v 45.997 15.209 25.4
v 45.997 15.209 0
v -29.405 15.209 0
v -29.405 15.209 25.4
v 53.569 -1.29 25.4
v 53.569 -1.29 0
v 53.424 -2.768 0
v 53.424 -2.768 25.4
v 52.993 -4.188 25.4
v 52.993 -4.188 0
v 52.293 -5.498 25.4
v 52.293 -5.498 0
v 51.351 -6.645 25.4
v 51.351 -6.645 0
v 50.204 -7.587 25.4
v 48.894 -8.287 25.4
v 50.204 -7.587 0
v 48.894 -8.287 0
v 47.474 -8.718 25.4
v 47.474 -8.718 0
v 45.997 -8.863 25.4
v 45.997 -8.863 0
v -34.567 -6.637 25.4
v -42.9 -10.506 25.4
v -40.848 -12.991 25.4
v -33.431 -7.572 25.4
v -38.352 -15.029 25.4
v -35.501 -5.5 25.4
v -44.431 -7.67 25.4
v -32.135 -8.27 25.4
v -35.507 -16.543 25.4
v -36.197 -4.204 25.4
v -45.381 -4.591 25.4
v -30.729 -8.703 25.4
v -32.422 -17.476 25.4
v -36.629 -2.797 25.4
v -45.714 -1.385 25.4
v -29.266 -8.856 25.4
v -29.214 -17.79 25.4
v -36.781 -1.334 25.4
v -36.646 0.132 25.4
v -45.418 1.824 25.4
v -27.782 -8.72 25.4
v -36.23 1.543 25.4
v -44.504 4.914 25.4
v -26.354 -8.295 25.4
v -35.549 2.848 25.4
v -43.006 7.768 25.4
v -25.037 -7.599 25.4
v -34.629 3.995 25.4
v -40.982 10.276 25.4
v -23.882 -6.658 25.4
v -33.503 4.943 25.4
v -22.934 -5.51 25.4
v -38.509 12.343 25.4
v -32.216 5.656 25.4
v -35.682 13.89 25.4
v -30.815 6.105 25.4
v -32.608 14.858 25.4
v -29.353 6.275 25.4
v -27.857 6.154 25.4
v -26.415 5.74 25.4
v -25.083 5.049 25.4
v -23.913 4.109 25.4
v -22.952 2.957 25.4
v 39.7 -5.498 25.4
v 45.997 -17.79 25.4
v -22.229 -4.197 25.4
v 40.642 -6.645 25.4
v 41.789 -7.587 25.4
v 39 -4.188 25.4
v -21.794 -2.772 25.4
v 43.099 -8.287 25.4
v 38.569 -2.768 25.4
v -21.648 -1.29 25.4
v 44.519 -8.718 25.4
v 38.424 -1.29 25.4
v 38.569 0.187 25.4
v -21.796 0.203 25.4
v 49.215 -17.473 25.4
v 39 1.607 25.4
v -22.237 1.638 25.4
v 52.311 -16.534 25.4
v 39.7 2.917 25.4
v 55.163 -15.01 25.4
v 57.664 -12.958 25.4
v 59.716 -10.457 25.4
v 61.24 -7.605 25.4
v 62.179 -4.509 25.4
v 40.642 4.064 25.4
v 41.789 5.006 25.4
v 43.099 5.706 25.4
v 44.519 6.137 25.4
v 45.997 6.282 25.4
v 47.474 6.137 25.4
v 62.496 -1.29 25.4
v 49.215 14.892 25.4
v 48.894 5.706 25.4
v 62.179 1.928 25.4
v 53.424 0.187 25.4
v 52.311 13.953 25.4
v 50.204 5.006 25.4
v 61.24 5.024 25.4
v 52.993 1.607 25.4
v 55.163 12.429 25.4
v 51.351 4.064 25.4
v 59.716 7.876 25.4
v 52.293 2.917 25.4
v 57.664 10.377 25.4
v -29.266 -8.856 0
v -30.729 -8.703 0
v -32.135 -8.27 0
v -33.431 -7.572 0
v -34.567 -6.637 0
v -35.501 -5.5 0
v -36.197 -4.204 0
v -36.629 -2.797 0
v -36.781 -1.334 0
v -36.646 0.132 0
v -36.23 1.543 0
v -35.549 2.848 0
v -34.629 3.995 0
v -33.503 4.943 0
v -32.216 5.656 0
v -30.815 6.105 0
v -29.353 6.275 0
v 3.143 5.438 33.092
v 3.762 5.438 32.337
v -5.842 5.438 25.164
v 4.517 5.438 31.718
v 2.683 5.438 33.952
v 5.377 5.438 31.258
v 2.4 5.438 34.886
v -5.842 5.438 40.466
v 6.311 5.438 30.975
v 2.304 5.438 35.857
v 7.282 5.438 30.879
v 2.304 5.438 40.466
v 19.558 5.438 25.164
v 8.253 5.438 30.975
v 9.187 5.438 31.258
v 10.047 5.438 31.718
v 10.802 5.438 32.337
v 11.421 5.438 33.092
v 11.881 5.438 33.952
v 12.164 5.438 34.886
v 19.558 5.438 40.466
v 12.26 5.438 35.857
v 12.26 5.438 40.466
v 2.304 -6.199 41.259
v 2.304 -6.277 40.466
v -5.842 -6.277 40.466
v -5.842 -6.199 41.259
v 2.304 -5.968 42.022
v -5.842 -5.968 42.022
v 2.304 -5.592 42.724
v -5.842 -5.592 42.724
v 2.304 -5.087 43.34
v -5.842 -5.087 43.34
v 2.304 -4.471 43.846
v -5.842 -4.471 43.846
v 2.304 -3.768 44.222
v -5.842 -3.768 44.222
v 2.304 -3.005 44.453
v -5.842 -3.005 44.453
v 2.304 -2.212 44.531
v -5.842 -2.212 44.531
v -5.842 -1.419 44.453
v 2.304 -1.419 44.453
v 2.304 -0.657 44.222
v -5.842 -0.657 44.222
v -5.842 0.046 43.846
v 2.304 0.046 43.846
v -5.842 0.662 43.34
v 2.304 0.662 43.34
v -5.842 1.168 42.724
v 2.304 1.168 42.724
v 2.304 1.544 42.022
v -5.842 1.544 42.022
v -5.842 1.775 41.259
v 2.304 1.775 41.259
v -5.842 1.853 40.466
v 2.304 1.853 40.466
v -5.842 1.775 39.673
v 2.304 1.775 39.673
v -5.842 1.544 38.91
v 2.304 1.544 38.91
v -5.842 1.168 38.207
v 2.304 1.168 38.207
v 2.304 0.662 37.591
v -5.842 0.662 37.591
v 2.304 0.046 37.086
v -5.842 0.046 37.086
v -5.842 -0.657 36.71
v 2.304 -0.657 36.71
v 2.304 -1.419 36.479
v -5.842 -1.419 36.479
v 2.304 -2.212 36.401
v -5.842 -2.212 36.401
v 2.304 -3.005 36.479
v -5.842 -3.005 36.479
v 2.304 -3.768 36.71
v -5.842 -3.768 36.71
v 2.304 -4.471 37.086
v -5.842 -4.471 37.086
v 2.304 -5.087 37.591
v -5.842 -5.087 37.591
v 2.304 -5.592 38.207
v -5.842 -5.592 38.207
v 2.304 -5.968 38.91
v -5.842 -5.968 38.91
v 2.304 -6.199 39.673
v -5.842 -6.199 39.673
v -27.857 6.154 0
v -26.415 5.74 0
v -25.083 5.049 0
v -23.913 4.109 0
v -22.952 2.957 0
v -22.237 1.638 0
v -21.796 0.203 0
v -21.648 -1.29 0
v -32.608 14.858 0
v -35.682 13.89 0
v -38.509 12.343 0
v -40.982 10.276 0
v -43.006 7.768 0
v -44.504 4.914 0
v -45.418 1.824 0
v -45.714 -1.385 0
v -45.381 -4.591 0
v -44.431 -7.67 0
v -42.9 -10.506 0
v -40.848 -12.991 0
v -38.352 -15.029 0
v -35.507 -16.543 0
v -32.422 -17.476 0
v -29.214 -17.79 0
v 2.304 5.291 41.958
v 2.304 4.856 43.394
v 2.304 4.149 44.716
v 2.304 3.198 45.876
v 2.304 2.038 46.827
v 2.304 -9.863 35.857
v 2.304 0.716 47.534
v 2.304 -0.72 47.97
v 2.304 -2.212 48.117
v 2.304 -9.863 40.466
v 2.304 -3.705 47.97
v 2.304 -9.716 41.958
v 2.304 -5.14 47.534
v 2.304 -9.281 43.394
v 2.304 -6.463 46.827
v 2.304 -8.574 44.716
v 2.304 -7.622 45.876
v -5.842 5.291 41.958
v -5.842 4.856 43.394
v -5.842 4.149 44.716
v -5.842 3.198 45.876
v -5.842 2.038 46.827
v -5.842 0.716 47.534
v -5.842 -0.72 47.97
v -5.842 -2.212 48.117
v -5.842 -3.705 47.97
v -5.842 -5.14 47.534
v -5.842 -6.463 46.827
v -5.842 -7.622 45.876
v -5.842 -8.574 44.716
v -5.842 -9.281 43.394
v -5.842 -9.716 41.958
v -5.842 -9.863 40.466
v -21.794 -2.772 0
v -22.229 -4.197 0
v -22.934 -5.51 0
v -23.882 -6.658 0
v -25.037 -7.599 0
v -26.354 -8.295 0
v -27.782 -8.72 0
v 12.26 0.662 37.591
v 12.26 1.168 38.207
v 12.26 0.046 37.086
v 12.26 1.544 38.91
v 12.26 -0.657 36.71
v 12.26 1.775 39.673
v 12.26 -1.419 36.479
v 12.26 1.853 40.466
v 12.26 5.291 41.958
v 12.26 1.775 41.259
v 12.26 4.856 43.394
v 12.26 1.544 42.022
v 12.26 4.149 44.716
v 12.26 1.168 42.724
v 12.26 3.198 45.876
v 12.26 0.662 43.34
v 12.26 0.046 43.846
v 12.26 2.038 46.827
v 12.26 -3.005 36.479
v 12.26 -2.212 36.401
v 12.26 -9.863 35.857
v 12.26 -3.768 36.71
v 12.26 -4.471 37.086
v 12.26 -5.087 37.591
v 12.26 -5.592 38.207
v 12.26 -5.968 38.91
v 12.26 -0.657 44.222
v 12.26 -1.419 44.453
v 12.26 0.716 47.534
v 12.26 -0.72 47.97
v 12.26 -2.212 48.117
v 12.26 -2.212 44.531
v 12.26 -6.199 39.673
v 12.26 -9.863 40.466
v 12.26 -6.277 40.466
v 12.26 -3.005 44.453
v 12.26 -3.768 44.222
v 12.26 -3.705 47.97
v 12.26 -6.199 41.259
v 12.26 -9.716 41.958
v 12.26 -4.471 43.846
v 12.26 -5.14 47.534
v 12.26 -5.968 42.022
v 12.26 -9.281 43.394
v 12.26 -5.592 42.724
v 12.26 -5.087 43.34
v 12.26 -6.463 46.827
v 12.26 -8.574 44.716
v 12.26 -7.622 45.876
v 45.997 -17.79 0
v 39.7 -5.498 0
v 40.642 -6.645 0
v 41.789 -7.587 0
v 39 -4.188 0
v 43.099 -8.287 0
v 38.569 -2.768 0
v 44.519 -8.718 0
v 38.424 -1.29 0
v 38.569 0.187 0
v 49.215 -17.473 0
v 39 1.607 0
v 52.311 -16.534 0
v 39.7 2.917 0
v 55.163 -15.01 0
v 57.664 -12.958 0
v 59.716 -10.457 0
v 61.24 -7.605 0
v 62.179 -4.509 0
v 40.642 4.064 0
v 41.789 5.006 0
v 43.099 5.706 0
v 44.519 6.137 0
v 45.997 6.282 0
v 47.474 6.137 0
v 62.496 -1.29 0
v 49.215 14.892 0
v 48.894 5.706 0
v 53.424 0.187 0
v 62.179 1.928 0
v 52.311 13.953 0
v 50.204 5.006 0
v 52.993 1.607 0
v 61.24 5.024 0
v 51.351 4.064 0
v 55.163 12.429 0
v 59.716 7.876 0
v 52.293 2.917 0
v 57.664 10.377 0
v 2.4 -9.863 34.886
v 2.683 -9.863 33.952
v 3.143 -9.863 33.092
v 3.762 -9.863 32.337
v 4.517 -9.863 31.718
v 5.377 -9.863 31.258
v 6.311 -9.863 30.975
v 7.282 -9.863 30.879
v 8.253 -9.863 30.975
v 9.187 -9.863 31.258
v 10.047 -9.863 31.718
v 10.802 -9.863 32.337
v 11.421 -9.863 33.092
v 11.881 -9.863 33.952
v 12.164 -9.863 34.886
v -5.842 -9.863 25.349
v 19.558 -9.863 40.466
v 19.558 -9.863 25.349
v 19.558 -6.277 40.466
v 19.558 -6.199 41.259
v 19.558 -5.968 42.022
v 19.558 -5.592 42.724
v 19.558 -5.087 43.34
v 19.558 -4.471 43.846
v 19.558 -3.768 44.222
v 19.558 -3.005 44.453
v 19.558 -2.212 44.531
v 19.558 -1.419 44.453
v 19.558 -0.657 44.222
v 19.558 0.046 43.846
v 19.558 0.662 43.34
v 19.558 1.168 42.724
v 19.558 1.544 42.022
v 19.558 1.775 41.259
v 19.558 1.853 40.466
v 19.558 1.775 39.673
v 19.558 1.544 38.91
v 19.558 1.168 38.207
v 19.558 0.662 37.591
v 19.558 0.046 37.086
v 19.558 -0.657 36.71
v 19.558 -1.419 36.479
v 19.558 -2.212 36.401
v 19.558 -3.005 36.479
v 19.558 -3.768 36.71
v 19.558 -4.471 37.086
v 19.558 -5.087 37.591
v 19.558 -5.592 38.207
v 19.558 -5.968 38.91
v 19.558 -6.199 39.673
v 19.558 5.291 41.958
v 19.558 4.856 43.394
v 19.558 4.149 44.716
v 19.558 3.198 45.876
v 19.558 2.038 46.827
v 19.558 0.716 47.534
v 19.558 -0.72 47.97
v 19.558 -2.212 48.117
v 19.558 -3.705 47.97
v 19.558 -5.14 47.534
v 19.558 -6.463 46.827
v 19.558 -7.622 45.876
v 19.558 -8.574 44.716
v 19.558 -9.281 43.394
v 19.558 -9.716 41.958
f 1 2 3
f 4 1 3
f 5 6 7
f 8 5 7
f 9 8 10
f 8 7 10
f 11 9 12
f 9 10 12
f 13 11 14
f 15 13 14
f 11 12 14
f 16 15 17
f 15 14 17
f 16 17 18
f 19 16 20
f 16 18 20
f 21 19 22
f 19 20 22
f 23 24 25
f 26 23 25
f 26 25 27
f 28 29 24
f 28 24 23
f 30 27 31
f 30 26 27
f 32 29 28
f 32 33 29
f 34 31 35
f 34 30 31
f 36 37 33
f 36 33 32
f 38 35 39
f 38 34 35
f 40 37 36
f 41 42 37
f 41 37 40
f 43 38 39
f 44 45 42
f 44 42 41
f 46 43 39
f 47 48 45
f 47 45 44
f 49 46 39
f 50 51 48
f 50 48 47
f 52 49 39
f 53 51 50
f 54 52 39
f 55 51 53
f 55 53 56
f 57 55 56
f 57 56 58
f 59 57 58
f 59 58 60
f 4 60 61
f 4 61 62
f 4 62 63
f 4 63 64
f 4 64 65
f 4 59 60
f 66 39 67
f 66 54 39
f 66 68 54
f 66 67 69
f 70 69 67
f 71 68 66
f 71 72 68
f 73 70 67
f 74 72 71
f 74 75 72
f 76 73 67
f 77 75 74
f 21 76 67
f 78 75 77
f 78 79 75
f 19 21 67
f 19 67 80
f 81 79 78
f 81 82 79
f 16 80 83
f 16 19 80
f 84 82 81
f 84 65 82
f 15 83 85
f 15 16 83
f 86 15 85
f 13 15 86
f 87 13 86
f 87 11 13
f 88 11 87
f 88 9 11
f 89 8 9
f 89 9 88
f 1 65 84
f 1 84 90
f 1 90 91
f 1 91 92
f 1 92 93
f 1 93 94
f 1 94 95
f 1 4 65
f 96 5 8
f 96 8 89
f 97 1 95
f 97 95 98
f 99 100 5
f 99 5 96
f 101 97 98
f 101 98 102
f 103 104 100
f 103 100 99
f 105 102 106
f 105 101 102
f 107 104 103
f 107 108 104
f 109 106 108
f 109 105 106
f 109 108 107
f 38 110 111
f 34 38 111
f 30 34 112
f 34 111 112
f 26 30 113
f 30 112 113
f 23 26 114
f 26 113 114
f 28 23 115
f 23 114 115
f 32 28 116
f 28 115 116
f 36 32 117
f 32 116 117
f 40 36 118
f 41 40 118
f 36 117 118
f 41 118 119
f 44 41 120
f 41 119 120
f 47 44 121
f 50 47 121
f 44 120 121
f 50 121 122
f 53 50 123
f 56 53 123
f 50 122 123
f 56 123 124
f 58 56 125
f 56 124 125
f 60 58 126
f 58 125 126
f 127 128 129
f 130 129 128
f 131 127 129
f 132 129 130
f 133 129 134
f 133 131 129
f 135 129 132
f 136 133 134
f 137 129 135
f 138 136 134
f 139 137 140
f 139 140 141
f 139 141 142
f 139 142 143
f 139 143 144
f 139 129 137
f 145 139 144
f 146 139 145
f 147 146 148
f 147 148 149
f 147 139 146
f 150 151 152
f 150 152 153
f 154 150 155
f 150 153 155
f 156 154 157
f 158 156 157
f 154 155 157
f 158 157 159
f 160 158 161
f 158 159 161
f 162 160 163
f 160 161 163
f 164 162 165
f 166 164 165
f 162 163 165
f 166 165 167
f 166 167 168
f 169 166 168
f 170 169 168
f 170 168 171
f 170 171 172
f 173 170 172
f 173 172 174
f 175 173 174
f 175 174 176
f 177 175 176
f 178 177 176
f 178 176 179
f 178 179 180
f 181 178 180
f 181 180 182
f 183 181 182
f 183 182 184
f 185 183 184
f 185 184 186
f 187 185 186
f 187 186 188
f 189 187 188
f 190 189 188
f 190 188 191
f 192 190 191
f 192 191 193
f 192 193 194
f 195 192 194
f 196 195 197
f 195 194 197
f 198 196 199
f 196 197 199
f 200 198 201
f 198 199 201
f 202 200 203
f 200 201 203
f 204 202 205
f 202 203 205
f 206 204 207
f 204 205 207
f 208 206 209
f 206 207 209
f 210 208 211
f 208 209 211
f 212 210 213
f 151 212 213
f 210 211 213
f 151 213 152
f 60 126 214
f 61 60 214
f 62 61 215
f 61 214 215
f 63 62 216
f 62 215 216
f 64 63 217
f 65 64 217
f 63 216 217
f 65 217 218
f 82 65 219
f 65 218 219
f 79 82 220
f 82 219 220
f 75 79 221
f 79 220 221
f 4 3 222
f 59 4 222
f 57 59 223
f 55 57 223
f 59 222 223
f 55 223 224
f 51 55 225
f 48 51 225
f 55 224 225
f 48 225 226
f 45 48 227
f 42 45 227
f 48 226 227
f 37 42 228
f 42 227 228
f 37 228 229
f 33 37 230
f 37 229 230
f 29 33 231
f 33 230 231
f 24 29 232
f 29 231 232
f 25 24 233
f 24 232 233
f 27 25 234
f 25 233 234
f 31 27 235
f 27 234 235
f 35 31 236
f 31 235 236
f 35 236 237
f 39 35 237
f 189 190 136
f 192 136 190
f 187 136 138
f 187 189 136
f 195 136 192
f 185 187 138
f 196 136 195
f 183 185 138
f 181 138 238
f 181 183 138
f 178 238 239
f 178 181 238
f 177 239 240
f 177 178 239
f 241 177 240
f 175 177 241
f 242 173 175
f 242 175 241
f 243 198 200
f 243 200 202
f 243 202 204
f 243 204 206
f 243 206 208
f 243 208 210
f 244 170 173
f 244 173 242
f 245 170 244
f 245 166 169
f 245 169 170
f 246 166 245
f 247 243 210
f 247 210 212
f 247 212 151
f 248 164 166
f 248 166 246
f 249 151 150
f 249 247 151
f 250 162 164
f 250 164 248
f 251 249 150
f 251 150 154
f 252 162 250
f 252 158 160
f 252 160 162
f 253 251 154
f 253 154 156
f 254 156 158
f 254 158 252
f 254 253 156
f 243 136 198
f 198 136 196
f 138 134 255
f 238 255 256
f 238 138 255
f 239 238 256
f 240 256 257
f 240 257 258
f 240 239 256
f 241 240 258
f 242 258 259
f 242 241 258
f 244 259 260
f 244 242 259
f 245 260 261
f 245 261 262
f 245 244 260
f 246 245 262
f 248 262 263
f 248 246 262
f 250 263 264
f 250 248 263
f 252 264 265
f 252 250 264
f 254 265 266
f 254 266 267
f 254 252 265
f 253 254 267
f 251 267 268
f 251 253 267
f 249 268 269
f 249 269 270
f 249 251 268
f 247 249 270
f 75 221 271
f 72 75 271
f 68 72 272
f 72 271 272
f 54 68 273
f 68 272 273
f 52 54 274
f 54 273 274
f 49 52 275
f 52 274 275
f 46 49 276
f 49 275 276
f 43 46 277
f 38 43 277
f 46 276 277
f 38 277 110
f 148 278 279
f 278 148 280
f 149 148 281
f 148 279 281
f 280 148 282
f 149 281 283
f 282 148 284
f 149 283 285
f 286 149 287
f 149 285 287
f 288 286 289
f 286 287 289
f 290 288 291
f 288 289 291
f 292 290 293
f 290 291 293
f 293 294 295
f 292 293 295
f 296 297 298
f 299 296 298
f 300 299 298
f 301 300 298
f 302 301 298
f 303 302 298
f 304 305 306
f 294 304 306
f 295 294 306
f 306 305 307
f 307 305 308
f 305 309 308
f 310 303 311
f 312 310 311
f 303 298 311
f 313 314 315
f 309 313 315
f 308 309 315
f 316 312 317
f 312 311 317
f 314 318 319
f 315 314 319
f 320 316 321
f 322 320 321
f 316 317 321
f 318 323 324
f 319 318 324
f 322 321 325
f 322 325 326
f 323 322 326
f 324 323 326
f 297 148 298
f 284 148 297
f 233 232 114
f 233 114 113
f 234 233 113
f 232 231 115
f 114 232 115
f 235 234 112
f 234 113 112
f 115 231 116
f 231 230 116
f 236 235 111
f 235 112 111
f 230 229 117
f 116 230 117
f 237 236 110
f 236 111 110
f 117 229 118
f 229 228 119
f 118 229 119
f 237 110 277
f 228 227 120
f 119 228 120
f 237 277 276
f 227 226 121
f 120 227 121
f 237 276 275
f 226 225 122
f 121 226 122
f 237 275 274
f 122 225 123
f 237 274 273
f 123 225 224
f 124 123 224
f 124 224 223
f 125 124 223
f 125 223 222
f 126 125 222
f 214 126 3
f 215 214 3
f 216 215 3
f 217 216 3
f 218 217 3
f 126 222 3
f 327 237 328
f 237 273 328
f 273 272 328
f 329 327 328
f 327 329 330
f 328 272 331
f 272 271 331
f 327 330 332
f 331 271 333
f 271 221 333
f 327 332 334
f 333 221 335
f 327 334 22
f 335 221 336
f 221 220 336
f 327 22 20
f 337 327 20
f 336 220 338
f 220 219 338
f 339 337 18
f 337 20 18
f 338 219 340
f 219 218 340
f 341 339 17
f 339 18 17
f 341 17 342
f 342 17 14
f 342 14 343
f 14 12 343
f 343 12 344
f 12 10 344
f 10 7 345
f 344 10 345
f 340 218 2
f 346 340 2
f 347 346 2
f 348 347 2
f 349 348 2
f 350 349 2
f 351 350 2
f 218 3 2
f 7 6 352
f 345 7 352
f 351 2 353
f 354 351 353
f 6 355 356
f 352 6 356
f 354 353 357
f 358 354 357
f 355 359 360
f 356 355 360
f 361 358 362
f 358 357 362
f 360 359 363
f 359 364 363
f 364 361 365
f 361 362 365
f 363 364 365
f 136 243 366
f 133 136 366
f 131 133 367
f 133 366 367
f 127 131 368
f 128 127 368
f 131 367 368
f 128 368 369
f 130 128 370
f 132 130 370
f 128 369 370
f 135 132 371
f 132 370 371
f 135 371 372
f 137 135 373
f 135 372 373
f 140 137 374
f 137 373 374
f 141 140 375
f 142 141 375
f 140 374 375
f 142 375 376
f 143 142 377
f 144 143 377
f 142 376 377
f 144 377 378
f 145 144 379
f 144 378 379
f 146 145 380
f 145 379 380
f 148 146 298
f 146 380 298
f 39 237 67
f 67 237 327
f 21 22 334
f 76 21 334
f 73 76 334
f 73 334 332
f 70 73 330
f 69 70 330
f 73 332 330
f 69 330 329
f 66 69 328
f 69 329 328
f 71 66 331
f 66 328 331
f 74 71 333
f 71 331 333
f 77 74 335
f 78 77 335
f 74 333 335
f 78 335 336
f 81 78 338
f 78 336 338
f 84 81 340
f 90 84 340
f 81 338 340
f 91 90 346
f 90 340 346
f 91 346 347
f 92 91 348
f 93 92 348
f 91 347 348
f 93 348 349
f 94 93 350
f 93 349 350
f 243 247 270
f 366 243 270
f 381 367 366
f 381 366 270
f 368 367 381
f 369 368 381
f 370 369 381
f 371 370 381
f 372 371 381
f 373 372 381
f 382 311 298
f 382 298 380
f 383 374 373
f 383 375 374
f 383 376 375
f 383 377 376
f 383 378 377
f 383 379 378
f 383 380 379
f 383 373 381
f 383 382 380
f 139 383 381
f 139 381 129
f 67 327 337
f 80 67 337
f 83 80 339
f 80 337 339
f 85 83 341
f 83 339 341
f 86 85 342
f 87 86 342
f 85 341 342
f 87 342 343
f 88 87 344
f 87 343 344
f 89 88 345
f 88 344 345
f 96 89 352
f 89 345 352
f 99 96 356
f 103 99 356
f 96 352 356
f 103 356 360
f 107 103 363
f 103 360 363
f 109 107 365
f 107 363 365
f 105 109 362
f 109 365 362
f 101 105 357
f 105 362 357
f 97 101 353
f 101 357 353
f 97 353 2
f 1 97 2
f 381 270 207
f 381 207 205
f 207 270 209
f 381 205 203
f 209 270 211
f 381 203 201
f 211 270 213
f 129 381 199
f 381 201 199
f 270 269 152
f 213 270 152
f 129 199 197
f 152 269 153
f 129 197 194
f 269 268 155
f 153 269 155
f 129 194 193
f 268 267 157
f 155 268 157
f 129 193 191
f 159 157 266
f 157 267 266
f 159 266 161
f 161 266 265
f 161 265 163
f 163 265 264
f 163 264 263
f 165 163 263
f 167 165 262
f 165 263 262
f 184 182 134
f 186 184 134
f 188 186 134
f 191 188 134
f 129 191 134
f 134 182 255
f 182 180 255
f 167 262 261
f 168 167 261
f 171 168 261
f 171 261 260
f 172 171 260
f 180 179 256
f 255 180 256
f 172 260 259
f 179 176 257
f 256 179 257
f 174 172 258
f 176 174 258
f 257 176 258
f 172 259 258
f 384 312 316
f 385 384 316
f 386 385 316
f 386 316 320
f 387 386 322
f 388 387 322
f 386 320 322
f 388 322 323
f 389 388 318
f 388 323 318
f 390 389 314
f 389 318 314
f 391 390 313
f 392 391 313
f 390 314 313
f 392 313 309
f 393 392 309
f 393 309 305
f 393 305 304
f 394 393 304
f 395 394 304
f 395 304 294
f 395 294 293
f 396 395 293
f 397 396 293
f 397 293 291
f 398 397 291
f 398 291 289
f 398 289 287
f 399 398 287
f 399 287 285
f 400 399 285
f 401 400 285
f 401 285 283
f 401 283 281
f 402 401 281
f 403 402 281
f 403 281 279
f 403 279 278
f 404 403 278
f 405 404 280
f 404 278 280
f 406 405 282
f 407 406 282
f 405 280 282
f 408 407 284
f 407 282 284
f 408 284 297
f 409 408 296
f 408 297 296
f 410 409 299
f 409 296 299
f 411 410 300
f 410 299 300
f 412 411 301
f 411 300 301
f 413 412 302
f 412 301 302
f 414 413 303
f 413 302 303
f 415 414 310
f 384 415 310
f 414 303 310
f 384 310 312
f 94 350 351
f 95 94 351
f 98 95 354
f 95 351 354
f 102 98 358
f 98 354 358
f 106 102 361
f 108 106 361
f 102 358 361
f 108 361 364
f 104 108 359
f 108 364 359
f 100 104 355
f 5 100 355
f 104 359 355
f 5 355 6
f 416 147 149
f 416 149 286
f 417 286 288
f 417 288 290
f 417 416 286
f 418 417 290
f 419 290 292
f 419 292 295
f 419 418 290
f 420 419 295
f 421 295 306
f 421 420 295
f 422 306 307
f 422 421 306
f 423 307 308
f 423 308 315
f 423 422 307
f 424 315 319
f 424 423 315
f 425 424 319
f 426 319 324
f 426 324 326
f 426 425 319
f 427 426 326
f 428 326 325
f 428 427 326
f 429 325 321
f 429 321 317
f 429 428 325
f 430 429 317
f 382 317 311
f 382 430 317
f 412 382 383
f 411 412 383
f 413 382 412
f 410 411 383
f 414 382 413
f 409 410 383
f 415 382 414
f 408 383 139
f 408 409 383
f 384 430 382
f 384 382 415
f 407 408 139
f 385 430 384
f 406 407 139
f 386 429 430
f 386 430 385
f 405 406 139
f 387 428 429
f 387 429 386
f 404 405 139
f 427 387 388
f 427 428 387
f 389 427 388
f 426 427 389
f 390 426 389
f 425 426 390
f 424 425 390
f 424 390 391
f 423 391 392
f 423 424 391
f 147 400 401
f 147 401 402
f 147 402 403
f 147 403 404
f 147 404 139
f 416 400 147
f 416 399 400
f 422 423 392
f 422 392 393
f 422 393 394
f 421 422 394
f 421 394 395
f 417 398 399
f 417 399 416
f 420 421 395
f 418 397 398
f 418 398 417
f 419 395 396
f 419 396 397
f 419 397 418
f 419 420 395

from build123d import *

# Parameters (mm, degrees)
F1_DEPTH = 25.4
F3_DEPTH = 12.7
F6_W     = 9.955159
F6_H     = 15.854515
F7_DEPTH = 12.7
F8_R     = 4.065218
F9_DEPTH = 25.654


with BuildPart() as f1:
    # F0 (on Top) → F1 (new body)
    with BuildSketch(Plane.XY):
        with BuildLine():
            Line((45.996532, 15.209274), (-29.404597, 15.209274))
            Line((-29.404597, 15.209274), (-29.353035, 6.275321))
            ThreePointArc((-29.353035, 6.275321), (-23.913131, 4.109294), (-21.647612, -1.289934))
            ThreePointArc((-21.647612, -1.289934), (-23.882058, -6.658477), (-29.265704, -8.856288))
            Line((-29.265704, -8.856288), (-29.214142, -17.790241))
            Line((-29.214142, -17.790241), (45.996532, -17.790241))
            Line((45.996532, -17.790241), (45.996532, -8.863065))
            ThreePointArc((45.996532, -8.863065), (38.42395, -1.290483), (45.996532, 6.282098))
            Line((45.996532, 6.282098), (45.996532, 15.209274))
        make_face()
        with BuildLine():
            Line((-29.353035, 6.275321), (-29.404597, 15.209274))
            ThreePointArc((-29.404597, 15.209274), (-45.714174, -1.385163), (-29.214142, -17.790241))
            Line((-29.214142, -17.790241), (-29.265704, -8.856288))
            ThreePointArc((-29.265704, -8.856288), (-36.780546, -1.333603), (-29.353035, 6.275321))
        make_face()
        with BuildLine():
            ThreePointArc((45.996532, -17.790241), (62.49629, -1.290483), (45.996532, 15.209274))
            Line((45.996532, 15.209274), (45.996532, 6.282098))
            ThreePointArc((45.996532, 6.282098), (51.351156, 4.06414), (53.569113, -1.290483))
            ThreePointArc((53.569113, -1.290483), (51.351156, -6.645107), (45.996532, -8.863065))
            Line((45.996532, -8.863065), (45.996532, -17.790241))
        make_face()
    extrude(amount=F1_DEPTH)


with BuildPart() as f3:
    # F2 (on Right) → F3 (new body, symmetric)
    with BuildSketch(Plane.YZ):
        Polygon((-9.862985, 40.465884), (-9.862985, 25.348788), (5.438465, 25.164433), (5.438465, 40.465884), align=None)
        with BuildLine():
            ThreePointArc((5.438465, 40.465884), (-2.21226, 48.116609), (-9.862985, 40.465884))
            Line((-9.862985, 40.465884), (5.438465, 40.465884))
        make_face()
    extrude(amount=F3_DEPTH, both=True)


with BuildPart() as f1_1:
    # F4: moved
    add(f1.part)


with BuildPart() as f3_1:
    # F5: moved
    add(f3.part.moved(Location((6.858, 0, 0))))

    # F6 (on Front) → F7 (cut, symmetric)
    with BuildSketch(Plane.XZ):
        with Locations((7.282014, 43.784275)):
            Rectangle(F6_W, F6_H)
        with BuildLine():
            Line((12.259594, 35.857018), (2.304435, 35.857018))
            ThreePointArc((2.304435, 35.857018), (7.282014, 30.879438), (12.259594, 35.857018))
        make_face()
    extrude(amount=F7_DEPTH, both=True, mode=Mode.SUBTRACT)

    # F8 (on face) → F9 (cut)
    with BuildSketch(Plane(origin=(-5.842, 0, 0), x_dir=(0, -1, 0), z_dir=(-1, 0, 0))):
        with Locations((2.21226, 40.465884)):
            Circle(F8_R)
    extrude(amount=-F9_DEPTH, mode=Mode.SUBTRACT)


solid = Compound([f1_1.part, f3_1.part])
